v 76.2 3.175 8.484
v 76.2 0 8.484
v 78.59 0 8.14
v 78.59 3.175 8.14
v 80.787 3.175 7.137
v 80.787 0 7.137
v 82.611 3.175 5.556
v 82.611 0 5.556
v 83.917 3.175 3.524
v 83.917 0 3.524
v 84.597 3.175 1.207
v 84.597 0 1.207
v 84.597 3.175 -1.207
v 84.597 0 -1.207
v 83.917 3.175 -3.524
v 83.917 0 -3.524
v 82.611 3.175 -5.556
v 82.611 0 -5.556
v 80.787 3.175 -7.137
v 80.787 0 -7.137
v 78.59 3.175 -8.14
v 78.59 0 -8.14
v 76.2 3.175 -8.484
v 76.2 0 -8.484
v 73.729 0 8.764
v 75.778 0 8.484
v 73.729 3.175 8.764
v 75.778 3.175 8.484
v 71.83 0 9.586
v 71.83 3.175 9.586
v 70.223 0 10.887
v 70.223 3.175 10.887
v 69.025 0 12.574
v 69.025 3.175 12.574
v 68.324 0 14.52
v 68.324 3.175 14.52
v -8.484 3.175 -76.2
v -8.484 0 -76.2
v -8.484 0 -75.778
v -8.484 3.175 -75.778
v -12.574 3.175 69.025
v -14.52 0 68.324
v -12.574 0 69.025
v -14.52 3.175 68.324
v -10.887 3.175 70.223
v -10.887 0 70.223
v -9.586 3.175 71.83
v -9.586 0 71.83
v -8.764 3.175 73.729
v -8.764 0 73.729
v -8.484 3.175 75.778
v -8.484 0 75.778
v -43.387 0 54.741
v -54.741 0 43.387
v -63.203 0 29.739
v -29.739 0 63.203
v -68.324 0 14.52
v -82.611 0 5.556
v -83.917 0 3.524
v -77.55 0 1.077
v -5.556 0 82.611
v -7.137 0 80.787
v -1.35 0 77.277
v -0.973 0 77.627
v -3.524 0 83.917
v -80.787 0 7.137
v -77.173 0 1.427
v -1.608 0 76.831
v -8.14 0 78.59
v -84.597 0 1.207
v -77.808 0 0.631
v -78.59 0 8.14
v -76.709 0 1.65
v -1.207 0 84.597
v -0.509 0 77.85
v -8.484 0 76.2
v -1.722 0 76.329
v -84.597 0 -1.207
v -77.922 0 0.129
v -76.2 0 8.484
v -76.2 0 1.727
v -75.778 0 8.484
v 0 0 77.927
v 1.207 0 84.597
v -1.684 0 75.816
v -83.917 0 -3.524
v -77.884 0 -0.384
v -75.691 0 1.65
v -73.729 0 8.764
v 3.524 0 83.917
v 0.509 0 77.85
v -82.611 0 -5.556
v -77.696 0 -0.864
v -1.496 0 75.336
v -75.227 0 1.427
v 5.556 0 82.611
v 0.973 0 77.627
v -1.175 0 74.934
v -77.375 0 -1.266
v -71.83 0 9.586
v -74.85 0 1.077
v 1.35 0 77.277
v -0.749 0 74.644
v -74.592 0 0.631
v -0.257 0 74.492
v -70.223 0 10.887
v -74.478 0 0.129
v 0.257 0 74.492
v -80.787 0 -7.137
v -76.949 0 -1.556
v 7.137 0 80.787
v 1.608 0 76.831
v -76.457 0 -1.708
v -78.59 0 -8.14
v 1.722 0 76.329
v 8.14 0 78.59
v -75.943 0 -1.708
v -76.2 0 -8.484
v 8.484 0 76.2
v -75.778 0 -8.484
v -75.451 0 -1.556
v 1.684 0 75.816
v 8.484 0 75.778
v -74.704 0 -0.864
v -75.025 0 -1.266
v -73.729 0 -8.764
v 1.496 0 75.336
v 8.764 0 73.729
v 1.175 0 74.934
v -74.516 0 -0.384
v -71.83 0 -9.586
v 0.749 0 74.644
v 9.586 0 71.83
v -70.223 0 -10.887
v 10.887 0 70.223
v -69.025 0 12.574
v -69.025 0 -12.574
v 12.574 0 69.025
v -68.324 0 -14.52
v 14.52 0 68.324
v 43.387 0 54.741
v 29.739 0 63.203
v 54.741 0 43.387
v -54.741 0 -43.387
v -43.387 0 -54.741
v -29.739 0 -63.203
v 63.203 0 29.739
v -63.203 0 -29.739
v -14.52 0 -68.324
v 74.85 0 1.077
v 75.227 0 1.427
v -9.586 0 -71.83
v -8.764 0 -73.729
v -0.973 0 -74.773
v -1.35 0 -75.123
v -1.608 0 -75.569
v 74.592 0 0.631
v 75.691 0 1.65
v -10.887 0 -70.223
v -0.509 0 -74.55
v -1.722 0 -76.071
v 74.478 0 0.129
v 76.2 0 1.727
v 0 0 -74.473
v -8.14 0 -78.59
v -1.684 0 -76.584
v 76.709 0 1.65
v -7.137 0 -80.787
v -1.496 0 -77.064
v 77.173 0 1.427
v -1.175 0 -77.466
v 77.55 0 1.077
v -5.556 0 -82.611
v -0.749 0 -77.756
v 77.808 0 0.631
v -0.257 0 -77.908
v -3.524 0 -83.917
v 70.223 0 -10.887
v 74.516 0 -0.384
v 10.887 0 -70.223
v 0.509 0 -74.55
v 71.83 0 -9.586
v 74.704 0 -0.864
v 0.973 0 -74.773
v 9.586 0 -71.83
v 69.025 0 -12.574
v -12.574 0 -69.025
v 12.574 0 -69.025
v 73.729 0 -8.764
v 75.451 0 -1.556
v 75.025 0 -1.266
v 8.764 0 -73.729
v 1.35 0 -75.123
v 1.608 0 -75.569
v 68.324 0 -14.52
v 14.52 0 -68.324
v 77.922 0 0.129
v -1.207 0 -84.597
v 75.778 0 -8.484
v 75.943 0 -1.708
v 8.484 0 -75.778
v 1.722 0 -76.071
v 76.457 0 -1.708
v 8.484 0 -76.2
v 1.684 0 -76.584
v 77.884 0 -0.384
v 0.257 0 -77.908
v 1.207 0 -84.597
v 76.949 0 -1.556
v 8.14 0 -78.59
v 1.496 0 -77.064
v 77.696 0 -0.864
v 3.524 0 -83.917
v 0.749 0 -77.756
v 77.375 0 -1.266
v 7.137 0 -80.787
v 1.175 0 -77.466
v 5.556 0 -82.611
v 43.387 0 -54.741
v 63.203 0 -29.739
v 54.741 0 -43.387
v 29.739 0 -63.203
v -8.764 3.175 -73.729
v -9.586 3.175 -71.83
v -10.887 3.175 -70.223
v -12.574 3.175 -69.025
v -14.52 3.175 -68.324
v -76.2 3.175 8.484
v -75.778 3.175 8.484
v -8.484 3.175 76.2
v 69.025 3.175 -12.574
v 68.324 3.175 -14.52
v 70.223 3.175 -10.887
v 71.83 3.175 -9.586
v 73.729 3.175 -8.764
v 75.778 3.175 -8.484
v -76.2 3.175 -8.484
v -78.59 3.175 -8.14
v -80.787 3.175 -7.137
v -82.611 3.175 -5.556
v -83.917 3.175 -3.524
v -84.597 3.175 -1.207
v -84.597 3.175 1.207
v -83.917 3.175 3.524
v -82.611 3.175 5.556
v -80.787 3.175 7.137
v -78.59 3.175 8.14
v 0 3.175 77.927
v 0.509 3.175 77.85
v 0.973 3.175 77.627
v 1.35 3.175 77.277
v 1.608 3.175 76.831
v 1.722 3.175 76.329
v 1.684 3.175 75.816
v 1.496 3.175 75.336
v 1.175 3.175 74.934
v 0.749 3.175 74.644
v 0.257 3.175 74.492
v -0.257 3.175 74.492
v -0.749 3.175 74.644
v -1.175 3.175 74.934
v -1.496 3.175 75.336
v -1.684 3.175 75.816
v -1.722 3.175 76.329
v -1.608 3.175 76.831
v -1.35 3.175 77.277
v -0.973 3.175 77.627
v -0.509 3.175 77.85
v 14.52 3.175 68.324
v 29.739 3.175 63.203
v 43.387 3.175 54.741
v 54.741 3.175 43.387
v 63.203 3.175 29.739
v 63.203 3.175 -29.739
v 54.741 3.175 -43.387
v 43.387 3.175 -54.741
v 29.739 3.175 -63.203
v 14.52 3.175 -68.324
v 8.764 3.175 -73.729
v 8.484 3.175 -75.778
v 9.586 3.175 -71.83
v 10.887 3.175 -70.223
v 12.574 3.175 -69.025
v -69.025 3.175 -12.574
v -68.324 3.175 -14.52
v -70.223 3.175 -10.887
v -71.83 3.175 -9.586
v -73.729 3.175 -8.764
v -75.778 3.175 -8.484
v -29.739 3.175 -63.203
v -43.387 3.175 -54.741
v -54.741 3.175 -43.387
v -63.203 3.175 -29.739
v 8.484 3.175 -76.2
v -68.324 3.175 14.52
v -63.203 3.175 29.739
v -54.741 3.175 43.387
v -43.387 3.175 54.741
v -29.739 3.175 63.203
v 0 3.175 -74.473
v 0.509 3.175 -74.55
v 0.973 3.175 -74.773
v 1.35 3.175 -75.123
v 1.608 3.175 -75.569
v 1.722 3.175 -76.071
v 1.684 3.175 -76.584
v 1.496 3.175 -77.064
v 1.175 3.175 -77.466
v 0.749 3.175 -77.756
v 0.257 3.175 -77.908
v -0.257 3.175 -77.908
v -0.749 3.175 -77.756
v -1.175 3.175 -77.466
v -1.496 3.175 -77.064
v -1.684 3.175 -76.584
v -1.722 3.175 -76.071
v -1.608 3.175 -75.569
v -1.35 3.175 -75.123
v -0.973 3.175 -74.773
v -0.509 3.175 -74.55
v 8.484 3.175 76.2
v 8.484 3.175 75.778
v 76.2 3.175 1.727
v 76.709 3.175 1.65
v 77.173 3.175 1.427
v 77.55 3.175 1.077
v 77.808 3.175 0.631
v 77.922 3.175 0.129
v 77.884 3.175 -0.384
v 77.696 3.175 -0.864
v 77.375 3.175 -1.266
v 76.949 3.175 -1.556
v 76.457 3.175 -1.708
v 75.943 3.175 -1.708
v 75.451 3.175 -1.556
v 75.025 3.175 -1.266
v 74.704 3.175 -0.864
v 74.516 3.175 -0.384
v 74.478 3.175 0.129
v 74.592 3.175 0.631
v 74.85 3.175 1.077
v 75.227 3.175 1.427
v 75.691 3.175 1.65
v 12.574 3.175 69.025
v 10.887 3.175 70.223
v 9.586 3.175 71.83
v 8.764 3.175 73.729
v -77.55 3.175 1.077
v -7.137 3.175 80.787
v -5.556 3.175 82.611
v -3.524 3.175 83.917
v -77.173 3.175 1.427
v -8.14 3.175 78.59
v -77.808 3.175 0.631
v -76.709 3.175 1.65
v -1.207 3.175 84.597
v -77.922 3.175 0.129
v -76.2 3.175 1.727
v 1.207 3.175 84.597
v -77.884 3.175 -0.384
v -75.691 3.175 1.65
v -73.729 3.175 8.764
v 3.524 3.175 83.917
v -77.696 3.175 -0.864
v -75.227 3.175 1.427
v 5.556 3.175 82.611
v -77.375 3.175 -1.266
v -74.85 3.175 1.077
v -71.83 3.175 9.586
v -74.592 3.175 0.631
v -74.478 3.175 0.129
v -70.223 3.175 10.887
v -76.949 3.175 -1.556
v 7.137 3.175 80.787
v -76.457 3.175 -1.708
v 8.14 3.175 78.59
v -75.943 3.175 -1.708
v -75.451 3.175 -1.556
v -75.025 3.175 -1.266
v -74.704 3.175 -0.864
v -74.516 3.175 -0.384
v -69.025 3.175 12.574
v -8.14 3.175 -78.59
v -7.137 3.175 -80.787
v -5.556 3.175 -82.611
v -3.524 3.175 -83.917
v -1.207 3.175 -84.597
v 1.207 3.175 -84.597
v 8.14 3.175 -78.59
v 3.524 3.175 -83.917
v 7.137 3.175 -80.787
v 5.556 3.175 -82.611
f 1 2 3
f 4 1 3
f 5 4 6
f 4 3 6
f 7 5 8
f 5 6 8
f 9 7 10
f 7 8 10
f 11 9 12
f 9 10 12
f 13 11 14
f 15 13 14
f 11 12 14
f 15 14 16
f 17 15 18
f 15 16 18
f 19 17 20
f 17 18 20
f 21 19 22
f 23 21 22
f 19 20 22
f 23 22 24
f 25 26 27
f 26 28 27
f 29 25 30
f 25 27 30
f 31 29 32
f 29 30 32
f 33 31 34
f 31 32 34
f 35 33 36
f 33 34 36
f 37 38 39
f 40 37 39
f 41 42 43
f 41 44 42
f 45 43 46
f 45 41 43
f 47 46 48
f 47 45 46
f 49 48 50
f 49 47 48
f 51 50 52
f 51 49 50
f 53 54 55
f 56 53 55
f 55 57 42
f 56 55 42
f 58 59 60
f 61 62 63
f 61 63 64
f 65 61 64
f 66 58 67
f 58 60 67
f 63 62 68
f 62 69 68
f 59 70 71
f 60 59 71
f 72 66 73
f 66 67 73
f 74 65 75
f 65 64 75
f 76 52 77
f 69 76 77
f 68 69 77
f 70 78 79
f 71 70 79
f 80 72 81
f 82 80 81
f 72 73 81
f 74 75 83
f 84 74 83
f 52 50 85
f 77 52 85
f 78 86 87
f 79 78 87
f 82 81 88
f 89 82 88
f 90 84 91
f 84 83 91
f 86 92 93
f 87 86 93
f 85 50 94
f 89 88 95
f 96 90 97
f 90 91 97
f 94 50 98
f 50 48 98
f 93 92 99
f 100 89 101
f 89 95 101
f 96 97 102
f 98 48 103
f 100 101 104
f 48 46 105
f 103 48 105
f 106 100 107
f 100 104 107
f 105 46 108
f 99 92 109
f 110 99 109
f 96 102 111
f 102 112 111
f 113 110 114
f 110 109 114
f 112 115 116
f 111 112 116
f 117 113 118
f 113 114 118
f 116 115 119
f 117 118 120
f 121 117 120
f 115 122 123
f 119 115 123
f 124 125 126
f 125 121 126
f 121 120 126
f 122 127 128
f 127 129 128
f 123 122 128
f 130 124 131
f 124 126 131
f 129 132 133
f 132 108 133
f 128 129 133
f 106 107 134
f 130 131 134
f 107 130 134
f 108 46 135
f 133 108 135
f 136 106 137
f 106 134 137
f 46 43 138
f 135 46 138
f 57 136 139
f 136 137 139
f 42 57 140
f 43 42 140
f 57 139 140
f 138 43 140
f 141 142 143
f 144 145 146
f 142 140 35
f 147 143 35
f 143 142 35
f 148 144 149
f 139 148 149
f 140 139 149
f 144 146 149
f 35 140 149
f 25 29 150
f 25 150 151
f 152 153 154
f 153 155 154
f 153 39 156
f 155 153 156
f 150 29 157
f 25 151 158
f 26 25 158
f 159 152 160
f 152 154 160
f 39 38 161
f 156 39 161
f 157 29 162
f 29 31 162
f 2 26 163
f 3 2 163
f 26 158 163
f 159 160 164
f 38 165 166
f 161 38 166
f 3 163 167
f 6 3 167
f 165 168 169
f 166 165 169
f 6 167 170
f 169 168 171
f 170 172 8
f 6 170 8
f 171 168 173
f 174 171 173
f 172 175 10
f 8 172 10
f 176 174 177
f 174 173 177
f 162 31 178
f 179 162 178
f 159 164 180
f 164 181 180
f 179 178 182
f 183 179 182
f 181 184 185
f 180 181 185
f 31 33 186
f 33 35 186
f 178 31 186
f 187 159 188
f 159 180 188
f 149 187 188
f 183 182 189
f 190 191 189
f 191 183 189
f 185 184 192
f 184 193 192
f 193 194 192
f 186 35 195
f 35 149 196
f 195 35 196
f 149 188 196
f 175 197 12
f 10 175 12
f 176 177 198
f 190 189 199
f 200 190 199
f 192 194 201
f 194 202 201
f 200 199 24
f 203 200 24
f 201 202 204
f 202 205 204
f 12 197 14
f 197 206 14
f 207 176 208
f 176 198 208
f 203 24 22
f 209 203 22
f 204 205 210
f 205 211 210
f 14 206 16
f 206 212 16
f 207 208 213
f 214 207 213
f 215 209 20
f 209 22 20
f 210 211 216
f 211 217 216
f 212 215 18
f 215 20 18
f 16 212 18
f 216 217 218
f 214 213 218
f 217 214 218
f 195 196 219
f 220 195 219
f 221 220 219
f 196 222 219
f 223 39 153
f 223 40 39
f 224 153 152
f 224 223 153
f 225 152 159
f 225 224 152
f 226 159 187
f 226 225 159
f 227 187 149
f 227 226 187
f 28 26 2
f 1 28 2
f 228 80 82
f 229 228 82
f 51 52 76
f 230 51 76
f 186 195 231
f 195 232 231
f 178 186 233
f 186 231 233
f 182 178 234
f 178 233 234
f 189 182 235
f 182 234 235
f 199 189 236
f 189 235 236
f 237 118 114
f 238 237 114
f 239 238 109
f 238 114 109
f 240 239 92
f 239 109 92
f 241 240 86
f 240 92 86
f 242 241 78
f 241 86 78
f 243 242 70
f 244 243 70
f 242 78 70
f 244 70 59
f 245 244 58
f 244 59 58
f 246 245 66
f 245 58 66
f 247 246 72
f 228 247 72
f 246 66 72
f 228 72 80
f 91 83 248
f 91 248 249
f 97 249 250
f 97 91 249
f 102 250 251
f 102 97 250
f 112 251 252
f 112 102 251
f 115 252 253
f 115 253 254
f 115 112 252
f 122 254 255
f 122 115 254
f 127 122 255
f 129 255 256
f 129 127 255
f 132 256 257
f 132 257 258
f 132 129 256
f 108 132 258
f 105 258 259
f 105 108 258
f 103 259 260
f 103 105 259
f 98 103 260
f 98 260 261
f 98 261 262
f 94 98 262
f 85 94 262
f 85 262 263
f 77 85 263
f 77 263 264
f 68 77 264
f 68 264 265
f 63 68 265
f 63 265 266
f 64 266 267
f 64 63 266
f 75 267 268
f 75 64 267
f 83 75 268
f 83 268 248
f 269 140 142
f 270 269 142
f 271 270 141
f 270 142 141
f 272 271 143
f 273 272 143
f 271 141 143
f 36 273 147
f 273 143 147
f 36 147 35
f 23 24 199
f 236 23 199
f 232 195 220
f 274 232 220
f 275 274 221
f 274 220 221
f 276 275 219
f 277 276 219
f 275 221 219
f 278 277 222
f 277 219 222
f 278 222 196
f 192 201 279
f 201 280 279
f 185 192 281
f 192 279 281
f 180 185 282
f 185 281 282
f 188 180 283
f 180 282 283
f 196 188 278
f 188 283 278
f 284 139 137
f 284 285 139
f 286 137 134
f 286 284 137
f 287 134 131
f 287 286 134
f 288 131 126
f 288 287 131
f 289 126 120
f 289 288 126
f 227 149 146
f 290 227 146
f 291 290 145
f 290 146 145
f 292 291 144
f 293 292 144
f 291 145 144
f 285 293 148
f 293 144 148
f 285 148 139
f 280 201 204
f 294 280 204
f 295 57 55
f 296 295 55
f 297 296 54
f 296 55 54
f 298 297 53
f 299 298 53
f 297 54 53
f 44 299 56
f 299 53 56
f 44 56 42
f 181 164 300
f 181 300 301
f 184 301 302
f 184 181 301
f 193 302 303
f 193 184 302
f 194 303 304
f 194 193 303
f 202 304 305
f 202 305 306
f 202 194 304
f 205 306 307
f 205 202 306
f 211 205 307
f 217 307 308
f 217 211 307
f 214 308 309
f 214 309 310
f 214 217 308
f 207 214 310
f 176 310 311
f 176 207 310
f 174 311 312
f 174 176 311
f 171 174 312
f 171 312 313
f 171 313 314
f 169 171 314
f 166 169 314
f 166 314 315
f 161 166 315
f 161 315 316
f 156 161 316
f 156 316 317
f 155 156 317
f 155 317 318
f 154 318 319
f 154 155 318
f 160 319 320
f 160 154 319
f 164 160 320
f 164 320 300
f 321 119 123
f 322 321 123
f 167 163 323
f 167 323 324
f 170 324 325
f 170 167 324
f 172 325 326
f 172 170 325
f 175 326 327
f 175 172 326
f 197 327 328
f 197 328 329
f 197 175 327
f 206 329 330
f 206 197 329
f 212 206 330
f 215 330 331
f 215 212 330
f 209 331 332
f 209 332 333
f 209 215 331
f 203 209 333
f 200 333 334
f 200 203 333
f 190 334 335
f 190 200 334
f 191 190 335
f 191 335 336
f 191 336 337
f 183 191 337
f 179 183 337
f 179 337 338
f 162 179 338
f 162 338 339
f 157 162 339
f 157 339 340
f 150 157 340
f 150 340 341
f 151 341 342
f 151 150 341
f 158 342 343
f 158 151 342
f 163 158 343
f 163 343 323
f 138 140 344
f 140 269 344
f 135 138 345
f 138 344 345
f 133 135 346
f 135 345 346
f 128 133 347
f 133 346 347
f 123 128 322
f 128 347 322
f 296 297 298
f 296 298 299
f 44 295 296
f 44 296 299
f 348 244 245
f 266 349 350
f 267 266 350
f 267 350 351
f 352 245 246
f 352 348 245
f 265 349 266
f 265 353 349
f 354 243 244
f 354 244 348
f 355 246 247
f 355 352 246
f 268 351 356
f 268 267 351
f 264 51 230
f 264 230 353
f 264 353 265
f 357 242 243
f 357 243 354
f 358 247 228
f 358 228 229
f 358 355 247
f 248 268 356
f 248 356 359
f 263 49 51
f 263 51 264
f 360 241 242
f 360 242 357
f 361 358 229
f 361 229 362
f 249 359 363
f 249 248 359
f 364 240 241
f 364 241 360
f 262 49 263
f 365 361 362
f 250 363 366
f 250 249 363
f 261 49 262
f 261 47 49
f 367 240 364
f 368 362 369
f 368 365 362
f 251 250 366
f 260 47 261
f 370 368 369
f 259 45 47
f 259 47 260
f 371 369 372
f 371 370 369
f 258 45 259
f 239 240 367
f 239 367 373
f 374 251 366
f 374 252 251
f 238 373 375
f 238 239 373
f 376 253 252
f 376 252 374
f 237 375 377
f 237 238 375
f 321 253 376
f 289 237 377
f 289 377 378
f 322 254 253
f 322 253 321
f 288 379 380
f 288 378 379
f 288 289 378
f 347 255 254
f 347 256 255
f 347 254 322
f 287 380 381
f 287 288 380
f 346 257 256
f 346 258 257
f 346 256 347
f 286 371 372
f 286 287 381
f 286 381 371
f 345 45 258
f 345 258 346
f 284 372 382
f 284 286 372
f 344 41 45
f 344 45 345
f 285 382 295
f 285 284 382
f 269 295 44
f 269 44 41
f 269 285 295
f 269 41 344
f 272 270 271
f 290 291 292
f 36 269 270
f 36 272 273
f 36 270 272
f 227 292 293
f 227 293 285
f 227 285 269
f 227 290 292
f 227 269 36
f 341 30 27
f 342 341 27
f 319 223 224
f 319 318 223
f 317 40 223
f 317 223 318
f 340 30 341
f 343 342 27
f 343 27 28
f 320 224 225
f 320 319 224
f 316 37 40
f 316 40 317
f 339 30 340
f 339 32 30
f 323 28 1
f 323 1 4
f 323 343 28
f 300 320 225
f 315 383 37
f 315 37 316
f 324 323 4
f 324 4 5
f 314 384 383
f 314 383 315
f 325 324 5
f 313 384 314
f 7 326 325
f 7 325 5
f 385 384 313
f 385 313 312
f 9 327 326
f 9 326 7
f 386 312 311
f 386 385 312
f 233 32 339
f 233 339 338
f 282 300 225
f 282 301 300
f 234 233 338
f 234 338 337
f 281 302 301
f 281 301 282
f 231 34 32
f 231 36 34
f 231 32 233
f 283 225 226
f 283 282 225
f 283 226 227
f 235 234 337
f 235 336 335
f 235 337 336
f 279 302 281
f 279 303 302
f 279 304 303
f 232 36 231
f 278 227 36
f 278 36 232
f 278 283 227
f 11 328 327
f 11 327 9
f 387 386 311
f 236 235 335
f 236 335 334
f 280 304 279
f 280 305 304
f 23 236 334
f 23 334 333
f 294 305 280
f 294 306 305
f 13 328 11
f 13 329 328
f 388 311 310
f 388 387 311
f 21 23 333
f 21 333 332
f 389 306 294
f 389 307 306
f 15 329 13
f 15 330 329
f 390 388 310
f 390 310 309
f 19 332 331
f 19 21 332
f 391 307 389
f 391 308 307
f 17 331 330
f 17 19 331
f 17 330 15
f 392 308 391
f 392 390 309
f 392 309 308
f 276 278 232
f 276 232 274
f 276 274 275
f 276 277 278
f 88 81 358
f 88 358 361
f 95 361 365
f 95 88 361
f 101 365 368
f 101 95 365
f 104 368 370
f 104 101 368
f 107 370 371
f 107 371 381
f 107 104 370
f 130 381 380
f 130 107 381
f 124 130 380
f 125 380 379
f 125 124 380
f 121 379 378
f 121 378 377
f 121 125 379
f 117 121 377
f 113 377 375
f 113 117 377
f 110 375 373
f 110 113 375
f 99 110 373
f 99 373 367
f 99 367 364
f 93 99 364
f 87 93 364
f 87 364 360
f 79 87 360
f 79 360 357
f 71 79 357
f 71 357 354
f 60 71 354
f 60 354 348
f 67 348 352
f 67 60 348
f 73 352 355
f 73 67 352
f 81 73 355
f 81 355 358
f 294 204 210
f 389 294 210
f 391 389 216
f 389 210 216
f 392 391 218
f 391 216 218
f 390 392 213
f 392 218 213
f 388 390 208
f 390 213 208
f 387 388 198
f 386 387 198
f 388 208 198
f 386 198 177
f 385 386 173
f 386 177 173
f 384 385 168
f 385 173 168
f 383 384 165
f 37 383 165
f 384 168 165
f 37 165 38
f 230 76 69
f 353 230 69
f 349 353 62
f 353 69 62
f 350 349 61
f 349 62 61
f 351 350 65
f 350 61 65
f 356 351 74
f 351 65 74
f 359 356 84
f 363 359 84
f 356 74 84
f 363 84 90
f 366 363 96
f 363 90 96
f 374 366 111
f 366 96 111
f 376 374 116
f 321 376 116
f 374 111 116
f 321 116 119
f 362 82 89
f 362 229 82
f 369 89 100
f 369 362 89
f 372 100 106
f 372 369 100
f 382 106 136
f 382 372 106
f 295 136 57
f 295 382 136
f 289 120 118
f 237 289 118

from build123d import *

# Parameters (mm, degrees)
SKETCH1_R           = 1.7272
BOSS_EXTRUDE1_DEPTH = 3.175
FILLET2_R           = 7.62


with BuildPart() as part:
    # Sketch1 → Boss-Extrude1 (new body)
    with BuildSketch(Plane(origin=(0, 0, 0), x_dir=(1, 0, 0), z_dir=(0, 1, 0))):
        with BuildLine():
            Line((-8.4836, 76.2), (-8.4836, 69.332900062))
            ThreePointArc((-8.4836, 69.332900062), (-49.391408666, 49.391408666), (-69.332900062, 8.4836))
            Line((-69.332900062, 8.4836), (-76.2, 8.4836))
            ThreePointArc((-76.2, 8.4836), (-84.6836, 0), (-76.2, -8.4836))
            Line((-76.2, -8.4836), (-69.332900062, -8.4836))
            ThreePointArc((-69.332900062, -8.4836), (-49.391408666, -49.391408666), (-8.4836, -69.332900062))
            Line((-8.4836, -69.332900062), (-8.4836, -76.2))
            ThreePointArc((-8.4836, -76.2), (0, -84.6836), (8.4836, -76.2))
            Line((8.4836, -76.2), (8.4836, -69.332900062))
            ThreePointArc((8.4836, -69.332900062), (49.391408666, -49.391408666), (69.332900062, -8.4836))
            Line((69.332900062, -8.4836), (76.2, -8.4836))
            ThreePointArc((76.2, -8.4836), (84.6836, 0), (76.2, 8.4836))
            Line((76.2, 8.4836), (69.332900062, 8.4836))
            ThreePointArc((69.332900062, 8.4836), (49.391408666, 49.391408666), (8.4836, 69.332900062))
            Line((8.4836, 69.332900062), (8.4836, 76.2))
            ThreePointArc((8.4836, 76.2), (0, 84.6836), (-8.4836, 76.2))
        make_face()
        with Locations(Location((0, 76.2, 0), (0, 0, 270))):
            Circle(SKETCH1_R, mode=Mode.SUBTRACT)
        with Locations(Location((76.2, 0, 0), (0, 0, 270))):
            Circle(SKETCH1_R, mode=Mode.SUBTRACT)
        with Locations(Location((0, -76.2, 0), (0, 0, 270))):
            Circle(SKETCH1_R, mode=Mode.SUBTRACT)
        with Locations(Location((-76.2, 0, 0), (0, 0, 270))):
            Circle(SKETCH1_R, mode=Mode.SUBTRACT)
    extrude(amount=BOSS_EXTRUDE1_DEPTH)

    # Fillet2
    fillet2_edges = [part.edges().sort_by_distance(p)[0] for p in [
        (8.4836, 1.5875, -69.332900062),
        (69.332900062, 1.5875, -8.4836),
        (69.332900062, 1.5875, 8.4836),
        (8.4836, 1.5875, 69.332900062),
        (-8.4836, 1.5875, 69.332900062),
        (-69.332900062, 1.5875, 8.4836),
        (-69.332900062, 1.5875, -8.4836),
        (-8.4836, 1.5875, -69.332900062),
    ]]
    fillet(fillet2_edges, radius=FILLET2_R)


solid = part.part
